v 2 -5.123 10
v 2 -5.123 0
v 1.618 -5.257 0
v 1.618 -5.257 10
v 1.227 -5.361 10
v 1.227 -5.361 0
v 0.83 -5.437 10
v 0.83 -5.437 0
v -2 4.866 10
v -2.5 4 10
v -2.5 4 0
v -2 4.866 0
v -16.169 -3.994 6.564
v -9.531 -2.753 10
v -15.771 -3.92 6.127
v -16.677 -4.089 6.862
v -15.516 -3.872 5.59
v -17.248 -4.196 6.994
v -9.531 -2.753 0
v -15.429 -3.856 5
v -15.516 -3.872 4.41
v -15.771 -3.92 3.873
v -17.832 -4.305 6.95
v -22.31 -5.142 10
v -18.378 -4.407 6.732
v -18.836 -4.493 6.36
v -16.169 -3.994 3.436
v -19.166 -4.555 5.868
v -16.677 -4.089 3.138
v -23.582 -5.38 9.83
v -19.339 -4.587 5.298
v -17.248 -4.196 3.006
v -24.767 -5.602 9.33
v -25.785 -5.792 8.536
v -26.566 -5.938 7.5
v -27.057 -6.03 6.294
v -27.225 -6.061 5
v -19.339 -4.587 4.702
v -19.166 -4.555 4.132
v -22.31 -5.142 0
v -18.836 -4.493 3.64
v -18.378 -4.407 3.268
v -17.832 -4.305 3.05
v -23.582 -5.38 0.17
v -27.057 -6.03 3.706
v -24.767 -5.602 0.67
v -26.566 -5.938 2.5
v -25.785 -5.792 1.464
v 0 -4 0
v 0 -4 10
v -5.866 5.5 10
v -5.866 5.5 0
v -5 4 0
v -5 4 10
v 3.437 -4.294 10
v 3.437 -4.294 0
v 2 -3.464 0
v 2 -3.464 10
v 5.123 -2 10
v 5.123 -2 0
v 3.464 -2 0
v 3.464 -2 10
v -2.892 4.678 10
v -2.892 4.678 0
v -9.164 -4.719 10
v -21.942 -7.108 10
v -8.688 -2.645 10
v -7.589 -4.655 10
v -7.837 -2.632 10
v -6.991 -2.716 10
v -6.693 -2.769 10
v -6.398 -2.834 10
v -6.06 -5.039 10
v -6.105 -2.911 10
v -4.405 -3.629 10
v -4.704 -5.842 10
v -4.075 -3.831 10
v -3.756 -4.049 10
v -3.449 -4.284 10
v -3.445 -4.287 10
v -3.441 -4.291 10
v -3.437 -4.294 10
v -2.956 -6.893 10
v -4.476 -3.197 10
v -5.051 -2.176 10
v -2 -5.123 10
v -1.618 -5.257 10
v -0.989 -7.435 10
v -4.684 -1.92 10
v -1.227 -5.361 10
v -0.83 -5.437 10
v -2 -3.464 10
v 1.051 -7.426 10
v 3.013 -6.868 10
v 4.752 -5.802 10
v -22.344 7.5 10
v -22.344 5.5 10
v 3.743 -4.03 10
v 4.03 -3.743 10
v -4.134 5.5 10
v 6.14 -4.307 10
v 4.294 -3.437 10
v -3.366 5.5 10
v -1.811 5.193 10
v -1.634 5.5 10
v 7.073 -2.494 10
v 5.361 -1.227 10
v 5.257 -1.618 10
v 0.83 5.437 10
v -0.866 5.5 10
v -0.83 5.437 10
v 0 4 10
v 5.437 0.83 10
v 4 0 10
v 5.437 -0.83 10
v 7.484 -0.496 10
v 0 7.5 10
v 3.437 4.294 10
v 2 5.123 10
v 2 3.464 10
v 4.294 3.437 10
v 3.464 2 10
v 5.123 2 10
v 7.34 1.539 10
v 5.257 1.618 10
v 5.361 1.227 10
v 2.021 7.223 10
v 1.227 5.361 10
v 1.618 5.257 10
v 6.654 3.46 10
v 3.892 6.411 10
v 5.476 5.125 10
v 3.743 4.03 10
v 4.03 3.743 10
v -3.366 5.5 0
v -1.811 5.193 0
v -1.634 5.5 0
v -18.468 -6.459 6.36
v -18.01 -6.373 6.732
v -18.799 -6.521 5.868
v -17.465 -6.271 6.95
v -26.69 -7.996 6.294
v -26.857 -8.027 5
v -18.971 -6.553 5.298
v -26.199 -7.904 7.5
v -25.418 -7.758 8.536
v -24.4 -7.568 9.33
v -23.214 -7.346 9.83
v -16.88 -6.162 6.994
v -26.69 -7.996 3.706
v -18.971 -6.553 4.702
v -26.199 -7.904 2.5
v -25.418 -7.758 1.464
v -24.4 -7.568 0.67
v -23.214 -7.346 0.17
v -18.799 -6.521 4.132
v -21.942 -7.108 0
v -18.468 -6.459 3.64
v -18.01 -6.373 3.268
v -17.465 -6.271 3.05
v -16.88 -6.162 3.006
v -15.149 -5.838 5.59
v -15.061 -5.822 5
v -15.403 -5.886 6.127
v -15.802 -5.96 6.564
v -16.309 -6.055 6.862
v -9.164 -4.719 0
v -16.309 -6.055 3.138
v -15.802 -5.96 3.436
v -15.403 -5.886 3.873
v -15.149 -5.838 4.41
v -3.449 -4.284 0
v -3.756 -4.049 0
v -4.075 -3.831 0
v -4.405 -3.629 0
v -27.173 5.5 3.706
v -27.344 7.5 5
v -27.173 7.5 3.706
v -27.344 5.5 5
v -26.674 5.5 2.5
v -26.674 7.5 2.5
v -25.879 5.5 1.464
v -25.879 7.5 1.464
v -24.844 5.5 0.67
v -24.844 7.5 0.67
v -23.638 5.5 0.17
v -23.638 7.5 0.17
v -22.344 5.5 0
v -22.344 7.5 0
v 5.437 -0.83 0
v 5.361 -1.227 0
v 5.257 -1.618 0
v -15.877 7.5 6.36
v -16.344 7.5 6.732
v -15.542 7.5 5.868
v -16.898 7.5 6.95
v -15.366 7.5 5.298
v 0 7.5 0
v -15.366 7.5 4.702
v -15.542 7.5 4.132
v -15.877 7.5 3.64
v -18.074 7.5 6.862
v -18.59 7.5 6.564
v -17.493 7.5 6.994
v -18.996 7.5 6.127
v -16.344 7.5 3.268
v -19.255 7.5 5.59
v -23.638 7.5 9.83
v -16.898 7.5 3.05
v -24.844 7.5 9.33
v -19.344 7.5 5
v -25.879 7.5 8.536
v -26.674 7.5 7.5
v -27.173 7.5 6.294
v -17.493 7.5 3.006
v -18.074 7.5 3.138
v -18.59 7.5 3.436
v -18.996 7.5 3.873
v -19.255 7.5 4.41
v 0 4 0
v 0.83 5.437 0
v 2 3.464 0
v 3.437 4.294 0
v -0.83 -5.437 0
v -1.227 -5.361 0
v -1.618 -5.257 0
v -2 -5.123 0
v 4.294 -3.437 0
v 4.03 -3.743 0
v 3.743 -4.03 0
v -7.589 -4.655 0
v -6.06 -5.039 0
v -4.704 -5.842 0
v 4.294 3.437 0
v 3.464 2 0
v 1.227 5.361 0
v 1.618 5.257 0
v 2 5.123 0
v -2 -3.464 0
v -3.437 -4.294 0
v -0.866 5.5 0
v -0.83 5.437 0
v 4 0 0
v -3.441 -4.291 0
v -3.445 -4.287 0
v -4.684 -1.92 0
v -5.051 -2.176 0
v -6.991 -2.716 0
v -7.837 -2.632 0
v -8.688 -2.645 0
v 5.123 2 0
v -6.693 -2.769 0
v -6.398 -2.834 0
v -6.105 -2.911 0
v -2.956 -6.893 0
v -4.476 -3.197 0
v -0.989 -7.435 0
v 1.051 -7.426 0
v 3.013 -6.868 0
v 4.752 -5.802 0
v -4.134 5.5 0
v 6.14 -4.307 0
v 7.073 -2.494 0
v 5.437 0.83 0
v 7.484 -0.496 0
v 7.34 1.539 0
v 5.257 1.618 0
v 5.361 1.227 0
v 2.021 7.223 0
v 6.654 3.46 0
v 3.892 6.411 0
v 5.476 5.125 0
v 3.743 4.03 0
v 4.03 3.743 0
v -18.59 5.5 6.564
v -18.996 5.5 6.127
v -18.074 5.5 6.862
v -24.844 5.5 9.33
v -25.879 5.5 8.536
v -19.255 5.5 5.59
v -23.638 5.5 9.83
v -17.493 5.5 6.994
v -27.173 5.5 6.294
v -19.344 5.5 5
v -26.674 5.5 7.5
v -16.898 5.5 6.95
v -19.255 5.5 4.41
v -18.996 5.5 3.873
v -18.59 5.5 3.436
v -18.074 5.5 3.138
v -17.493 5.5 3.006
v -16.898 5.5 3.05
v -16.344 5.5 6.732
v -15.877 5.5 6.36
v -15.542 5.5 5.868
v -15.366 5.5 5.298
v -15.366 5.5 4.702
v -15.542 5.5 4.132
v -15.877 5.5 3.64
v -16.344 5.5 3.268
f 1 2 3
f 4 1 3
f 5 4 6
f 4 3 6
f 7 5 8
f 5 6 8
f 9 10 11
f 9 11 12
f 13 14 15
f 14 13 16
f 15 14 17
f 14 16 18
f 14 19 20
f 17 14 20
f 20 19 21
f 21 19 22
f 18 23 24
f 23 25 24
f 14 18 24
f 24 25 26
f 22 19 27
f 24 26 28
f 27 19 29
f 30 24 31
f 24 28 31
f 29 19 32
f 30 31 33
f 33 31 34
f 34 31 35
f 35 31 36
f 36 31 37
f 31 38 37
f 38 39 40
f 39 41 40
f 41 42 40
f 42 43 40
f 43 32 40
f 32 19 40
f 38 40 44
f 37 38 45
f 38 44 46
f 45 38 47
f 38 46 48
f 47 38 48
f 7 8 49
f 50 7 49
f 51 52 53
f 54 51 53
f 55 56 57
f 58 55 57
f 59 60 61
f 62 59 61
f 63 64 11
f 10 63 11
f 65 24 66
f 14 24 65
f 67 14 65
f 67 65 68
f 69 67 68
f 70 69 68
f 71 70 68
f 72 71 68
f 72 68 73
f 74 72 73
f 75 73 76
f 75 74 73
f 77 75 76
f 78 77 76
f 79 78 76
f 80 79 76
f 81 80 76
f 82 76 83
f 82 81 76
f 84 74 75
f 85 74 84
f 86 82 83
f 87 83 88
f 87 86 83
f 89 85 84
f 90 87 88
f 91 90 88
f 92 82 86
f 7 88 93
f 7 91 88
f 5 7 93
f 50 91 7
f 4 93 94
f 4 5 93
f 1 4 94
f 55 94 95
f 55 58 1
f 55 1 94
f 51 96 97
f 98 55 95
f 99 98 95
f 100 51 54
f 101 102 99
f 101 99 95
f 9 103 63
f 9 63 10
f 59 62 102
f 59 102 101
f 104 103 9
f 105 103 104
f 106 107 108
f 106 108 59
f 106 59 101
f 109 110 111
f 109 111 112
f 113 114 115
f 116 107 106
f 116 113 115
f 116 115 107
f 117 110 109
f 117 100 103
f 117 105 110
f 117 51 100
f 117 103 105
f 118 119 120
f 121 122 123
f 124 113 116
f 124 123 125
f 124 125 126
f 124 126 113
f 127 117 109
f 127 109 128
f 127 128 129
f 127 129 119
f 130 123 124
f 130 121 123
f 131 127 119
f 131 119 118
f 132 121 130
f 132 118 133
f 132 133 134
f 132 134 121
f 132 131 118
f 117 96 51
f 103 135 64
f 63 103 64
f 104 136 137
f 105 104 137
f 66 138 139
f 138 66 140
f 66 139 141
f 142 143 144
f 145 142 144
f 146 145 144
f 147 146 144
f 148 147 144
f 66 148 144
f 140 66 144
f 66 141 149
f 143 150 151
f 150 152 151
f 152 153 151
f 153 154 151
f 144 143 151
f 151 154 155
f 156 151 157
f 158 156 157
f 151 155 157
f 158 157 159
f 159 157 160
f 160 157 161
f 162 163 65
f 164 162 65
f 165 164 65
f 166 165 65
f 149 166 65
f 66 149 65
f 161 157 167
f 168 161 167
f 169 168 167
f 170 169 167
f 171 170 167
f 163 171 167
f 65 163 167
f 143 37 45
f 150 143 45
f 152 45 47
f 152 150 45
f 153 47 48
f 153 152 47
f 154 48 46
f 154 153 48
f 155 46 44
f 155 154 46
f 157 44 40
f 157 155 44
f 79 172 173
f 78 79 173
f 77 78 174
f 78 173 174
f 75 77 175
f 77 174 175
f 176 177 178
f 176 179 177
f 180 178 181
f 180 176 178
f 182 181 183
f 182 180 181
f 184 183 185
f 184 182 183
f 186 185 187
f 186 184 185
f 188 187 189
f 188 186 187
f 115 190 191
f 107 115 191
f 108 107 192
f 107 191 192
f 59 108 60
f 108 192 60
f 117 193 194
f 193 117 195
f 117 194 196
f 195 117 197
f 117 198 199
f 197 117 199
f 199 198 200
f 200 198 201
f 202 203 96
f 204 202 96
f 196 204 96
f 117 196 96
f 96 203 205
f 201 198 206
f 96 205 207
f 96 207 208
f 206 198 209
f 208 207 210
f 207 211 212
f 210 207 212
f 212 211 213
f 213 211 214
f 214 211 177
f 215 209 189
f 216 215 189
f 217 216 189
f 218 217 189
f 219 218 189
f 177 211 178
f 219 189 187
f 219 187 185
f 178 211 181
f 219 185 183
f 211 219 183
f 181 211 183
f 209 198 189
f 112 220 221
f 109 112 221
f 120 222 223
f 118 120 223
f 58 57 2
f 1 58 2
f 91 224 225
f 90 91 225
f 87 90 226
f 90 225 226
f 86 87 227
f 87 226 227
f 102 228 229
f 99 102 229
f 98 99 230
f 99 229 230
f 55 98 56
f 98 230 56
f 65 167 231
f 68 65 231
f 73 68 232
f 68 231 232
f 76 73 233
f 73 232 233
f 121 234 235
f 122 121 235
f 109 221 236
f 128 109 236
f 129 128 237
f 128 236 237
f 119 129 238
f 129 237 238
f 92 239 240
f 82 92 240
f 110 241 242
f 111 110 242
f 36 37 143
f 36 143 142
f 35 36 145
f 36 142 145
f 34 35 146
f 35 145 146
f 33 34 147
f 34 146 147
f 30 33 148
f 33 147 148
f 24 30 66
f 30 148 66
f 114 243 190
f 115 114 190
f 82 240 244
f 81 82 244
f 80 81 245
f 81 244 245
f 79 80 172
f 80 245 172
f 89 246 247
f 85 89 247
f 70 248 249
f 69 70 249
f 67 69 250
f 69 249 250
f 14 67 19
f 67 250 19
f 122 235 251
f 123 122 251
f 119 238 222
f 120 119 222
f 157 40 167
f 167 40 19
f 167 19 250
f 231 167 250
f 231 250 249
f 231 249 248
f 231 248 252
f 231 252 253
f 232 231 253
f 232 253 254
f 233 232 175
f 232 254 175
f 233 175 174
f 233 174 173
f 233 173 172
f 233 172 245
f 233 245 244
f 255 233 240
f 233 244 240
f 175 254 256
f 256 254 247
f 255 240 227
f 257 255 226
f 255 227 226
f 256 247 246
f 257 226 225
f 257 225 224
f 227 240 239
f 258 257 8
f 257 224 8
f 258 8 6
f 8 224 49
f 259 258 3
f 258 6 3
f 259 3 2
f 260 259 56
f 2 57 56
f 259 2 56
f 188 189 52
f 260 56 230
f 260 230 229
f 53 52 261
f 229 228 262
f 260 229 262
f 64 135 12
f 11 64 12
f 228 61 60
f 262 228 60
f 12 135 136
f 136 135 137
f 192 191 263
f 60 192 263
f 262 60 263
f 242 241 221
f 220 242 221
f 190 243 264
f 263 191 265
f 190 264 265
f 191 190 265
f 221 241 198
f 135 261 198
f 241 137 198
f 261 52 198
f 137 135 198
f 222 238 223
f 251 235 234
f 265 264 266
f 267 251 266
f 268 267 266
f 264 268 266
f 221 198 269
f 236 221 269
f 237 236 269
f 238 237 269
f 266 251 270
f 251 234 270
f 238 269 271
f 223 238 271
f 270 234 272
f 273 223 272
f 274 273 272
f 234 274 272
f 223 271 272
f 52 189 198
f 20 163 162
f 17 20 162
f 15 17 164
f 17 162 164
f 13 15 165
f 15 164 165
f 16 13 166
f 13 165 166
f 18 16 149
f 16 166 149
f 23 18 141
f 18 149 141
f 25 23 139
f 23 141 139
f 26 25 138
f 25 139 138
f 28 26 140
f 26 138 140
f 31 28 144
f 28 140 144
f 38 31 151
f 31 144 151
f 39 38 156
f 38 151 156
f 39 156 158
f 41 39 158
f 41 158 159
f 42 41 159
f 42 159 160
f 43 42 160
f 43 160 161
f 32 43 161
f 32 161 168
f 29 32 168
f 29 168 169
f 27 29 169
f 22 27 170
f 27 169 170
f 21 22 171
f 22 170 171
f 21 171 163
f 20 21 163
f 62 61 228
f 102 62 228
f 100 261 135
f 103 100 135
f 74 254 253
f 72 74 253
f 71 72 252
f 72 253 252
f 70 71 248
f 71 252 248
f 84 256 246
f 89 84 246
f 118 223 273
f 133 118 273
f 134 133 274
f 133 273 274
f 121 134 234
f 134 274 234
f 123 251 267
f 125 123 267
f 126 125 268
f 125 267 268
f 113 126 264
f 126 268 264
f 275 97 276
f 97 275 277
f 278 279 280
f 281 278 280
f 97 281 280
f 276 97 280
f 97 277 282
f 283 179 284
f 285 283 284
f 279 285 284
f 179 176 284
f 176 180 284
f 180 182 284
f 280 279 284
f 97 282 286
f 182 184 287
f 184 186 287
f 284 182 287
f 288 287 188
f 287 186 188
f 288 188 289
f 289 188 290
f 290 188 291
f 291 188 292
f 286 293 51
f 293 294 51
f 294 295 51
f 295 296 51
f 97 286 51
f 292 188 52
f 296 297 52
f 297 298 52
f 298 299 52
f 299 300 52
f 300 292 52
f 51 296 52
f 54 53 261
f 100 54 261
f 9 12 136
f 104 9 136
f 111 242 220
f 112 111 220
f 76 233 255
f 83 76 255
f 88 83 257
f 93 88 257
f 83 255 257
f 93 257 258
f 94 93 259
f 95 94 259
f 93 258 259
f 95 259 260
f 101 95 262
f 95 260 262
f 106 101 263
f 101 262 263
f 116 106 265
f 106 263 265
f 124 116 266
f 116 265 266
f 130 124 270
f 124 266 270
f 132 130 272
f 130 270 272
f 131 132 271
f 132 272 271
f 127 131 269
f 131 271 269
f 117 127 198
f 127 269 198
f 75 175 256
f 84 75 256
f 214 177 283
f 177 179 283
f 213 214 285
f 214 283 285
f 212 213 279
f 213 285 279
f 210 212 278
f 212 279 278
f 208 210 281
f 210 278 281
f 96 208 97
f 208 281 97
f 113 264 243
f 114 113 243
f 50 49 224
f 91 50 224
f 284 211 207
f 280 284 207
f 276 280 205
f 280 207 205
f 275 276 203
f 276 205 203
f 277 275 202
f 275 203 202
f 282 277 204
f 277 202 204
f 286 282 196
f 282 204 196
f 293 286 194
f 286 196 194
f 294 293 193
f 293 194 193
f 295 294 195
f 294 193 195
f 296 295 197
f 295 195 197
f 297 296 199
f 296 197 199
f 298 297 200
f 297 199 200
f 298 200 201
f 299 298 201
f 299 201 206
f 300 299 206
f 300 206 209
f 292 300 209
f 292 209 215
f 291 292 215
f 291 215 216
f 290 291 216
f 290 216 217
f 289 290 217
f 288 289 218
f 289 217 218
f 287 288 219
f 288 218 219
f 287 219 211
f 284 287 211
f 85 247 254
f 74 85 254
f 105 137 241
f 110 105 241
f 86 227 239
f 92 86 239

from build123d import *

# Parameters (mm, degrees)
F1_DEPTH = 10
F2_R     = 4.99999
F3_R     = 2
F4_DEPTH = 2
F5_R     = 2
F6_DEPTH = 2


# Not quite as in the source:
# - a fillet or chamfer is up to 0.001 mm smaller than in the source, because OpenCascade refuses the exact size


with BuildPart() as f1:
    # F0 (on Top) → F1 (new body)
    with BuildSketch(Plane.XY):
        Polygon((-5, 4), (-4.1339745962, 5.5), (-5.8660254038, 5.5), align=None)
        Polygon((-26.857039656, -8.0272581187), (-9.163588619, -4.7194203959), (-9.5311261437, -2.7534813918), (-27.2245771808, -6.0613191145), align=None)
        with BuildLine():
            ThreePointArc((-3.4370598373, -4.2937884991), (-2.75, -4.7631397208), (-2, -5.123475383))
            Line((-2, -5.123475383), (-2, -3.4641016151))
            Line((-2, -3.4641016151), (-3.4370598373, -4.2937884991))
        make_face()
        with BuildLine():
            ThreePointArc((-0.8296868839, -5.4370598373), (0, -5.5), (0.8296868839, -5.4370598373))
            Line((0.8296868839, -5.4370598373), (0, -4))
            Line((0, -4), (-0.8296868839, -5.4370598373))
        make_face()
        with BuildLine():
            ThreePointArc((2, -5.123475383), (2.75, -4.7631397208), (3.4370598373, -4.2937884991))
            Line((3.4370598373, -4.2937884991), (2, -3.4641016151))
            Line((2, -3.4641016151), (2, -5.123475383))
        make_face()
        with BuildLine():
            ThreePointArc((4.2937884991, -3.4370598373), (4.7631397208, -2.75), (5.123475383, -2))
            Line((5.123475383, -2), (3.4641016151, -2))
            Line((3.4641016151, -2), (4.2937884991, -3.4370598373))
        make_face()
        with BuildLine():
            ThreePointArc((5.4370598373, -0.8296868839), (5.5, 0), (5.4370598373, 0.8296868839))
            Line((5.4370598373, 0.8296868839), (4, 0))
            Line((4, 0), (5.4370598373, -0.8296868839))
        make_face()
        with BuildLine():
            Line((0, 4), (0.8296868839, 5.4370598373))
            ThreePointArc((0.8296868839, 5.4370598373), (0.416035392, 5.4842423864), (0, 5.5))
            Line((0, 5.5), (0, 4))
        make_face()
        with BuildLine():
            ThreePointArc((0, 5.5), (0.416035392, 5.4842423864), (0.8296868839, 5.4370598373))
            Line((0.8296868839, 5.4370598373), (0.8660254038, 5.5))
            Line((0.8660254038, 5.5), (0, 5.5))
        make_face()
        with BuildLine():
            Line((0, 4), (0, 5.5))
            ThreePointArc((0, 5.5), (-0.416035392, 5.4842423864), (-0.8296868839, 5.4370598373))
            Line((-0.8296868839, 5.4370598373), (0, 4))
        make_face()
        with BuildLine():
            Line((-2, 4.8660254038), (-1.8110659829, 5.1932687207))
            ThreePointArc((-1.8110659829, 5.1932687207), (-1.9058525019, 5.1592369824), (-2, 5.123475383))
            Line((-2, 5.123475383), (-2, 4.8660254038))
        make_face()
        with BuildLine():
            Line((-2, 4.8660254038), (-2, 5.123475383))
            ThreePointArc((-2, 5.123475383), (-2.4559554031, 4.9212074797), (-2.8917104606, 4.6784624196))
            Line((-2.8917104606, 4.6784624196), (-2.5, 4))
            Line((-2.5, 4), (-2, 4.8660254038))
        make_face()
        with BuildLine():
            ThreePointArc((-9.163588619, -4.7194203959), (-6.8106363862, -4.7920452574), (-4.7035733226, -5.8417803792))
            ThreePointArc((-4.7035733226, -5.8417803792), (-6.0524247462, -4.4292386131), (-6.9908223073, -2.7163216797))
            ThreePointArc((-6.9908223073, -2.7163216797), (-8.2625591256, -2.6265549538), (-9.5311261437, -2.7534813918))
            Line((-9.5311261437, -2.7534813918), (-9.163588619, -4.7194203959))
        make_face()
        with BuildLine():
            Line((-4.6842221141, -1.9200455203), (-4.9155419039, -2.4672753781))
            ThreePointArc((-4.9155419039, -2.4672753781), (-4.7096941165, -2.8405600379), (-4.4755547297, -3.196781172))
            Line((-4.4755547297, -3.196781172), (-4.6842221141, -1.9200455203))
        make_face()
        with BuildLine():
            Line((-4.6842221141, -1.9200455203), (-5.0512472947, -2.175982713))
            ThreePointArc((-5.0512472947, -2.175982713), (-4.9855224988, -2.3226203765), (-4.9155419039, -2.4672753781))
            Line((-4.9155419039, -2.4672753781), (-4.6842221141, -1.9200455203))
        make_face()
        with BuildLine():
            ThreePointArc((-0.8296868839, 5.4370598373), (-0.416035392, 5.4842423864), (0, 5.5))
            Line((0, 5.5), (-0.8660254038, 5.5))
            Line((-0.8660254038, 5.5), (-0.8296868839, 5.4370598373))
        make_face()
        with BuildLine():
            Line((-5.0512472947, -2.175982713), (-6.104954117, -2.9107627231))
            ThreePointArc((-6.104954117, -2.9107627231), (-5.6640980624, -3.0507217811), (-5.2327078262, -3.2175901813))
            Line((-5.2327078262, -3.2175901813), (-4.9155419039, -2.4672753781))
            ThreePointArc((-4.9155419039, -2.4672753781), (-4.9855224988, -2.3226203765), (-5.0512472947, -2.175982713))
        make_face()
        with BuildLine():
            ThreePointArc((-2, 5.123475383), (-1.9058525019, 5.1592369824), (-1.8110659829, 5.1932687207))
            Line((-1.8110659829, 5.1932687207), (-1.6339745962, 5.5))
            Line((-1.6339745962, 5.5), (-3.3660254038, 5.5))
            Line((-3.3660254038, 5.5), (-2.8917104606, 4.6784624196))
            ThreePointArc((-2.8917104606, 4.6784624196), (-2.4559554031, 4.9212074797), (-2, 5.123475383))
        make_face()
        with BuildLine():
            Line((-4.9155419039, -2.4672753781), (-5.2327078262, -3.2175901813))
            ThreePointArc((-5.2327078262, -3.2175901813), (-4.8124241684, -3.4107332523), (-4.404845606, -3.629416389))
            Line((-4.404845606, -3.629416389), (-4.4755547297, -3.196781172))
            ThreePointArc((-4.4755547297, -3.196781172), (-4.7096941165, -2.8405600379), (-4.9155419039, -2.4672753781))
        make_face()
        with BuildLine():
            ThreePointArc((0.8296868839, 5.4370598373), (1.4235047481, 5.3125920446), (2, 5.123475383))
            Line((2, 5.123475383), (2, 3.4641016151))
            Line((2, 3.4641016151), (3.4370598373, 4.2937884991))
            ThreePointArc((3.4370598373, 4.2937884991), (3.8890872965, 3.8890872965), (4.2937884991, 3.4370598373))
            Line((4.2937884991, 3.4370598373), (3.4641016151, 2))
            Line((3.4641016151, 2), (5.123475383, 2))
            ThreePointArc((5.123475383, 2), (5.3125920446, 1.4235047481), (5.4370598373, 0.8296868839))
            ThreePointArc((5.4370598373, 0.8296868839), (5.5, 0), (5.4370598373, -0.8296868839))
            ThreePointArc((5.4370598373, -0.8296868839), (5.3125920446, -1.4235047481), (5.123475383, -2))
            ThreePointArc((5.123475383, -2), (4.7631397208, -2.75), (4.2937884991, -3.4370598373))
            ThreePointArc((4.2937884991, -3.4370598373), (3.8890872965, -3.8890872965), (3.4370598373, -4.2937884991))
            ThreePointArc((3.4370598373, -4.2937884991), (2.75, -4.7631397208), (2, -5.123475383))
            ThreePointArc((2, -5.123475383), (1.4235047481, -5.3125920446), (0.8296868839, -5.4370598373))
            ThreePointArc((0.8296868839, -5.4370598373), (0, -5.5), (-0.8296868839, -5.4370598373))
            ThreePointArc((-0.8296868839, -5.4370598373), (-1.4235047481, -5.3125920446), (-2, -5.123475383))
            ThreePointArc((-2, -5.123475383), (-2.75, -4.7631397208), (-3.4370598373, -4.2937884991))
            ThreePointArc((-3.4370598373, -4.2937884991), (-3.4431769685, -4.2888847459), (-3.4492871033, -4.2839722781))
            ThreePointArc((-3.4492871033, -4.2839722781), (-3.9144118435, -3.9382205471), (-4.404845606, -3.629416389))
            ThreePointArc((-4.404845606, -3.629416389), (-4.8124241684, -3.4107332523), (-5.2327078262, -3.2175901813))
            ThreePointArc((-5.2327078262, -3.2175901813), (-5.6640980624, -3.0507217811), (-6.104954117, -2.9107627231))
            ThreePointArc((-6.104954117, -2.9107627231), (-6.544946362, -2.800139211), (-6.9908223073, -2.7163216797))
            ThreePointArc((-6.9908223073, -2.7163216797), (-6.0524247462, -4.4292386131), (-4.7035733226, -5.8417803792))
            ThreePointArc((-4.7035733226, -5.8417803792), (7.0733073185, -2.493656668), (0, 7.5))
            Line((0, 7.5), (-27.3435036541, 7.5))
            Line((-27.3435036541, 7.5), (-27.3435036541, 5.5))
            Line((-27.3435036541, 5.5), (-5.8660254038, 5.5))
            Line((-5.8660254038, 5.5), (-4.1339745962, 5.5))
            Line((-4.1339745962, 5.5), (-3.3660254038, 5.5))
            Line((-3.3660254038, 5.5), (-1.6339745962, 5.5))
            Line((-1.6339745962, 5.5), (-0.8660254038, 5.5))
            Line((-0.8660254038, 5.5), (0, 5.5))
            Line((0, 5.5), (0.8660254038, 5.5))
            Line((0.8660254038, 5.5), (0.8296868839, 5.4370598373))
        make_face()
    extrude(amount=F1_DEPTH)

    # F2 (radius 5 in the source; OpenCascade refuses exactly that, so slightly less here)
    f2_edges = [f1.edges().sort_by_distance(p)[0] for p in [
        (-27.343504, 6.5, 10),
        (-27.343504, 6.5, 0),
        (-27.040808, -7.044289, 0),
        (-27.040808, -7.044289, 10),
    ]]
    fillet(f2_edges, radius=F2_R)

    # F3 (on face) → F4 (cut)
    with BuildSketch(Plane(origin=(0.5430486336, -2.9047387492, 0), x_dir=(0.9829695021, 0.1837687624, 0), z_dir=(0.1837687624, -0.9829695021, 0))):
        with Locations((-17.8748101871, 5)):
            Circle(F3_R)
    extrude(amount=-F4_DEPTH, mode=Mode.SUBTRACT)

    # F5 (on face) → F6 (cut)
    with BuildSketch(Plane(origin=(0, 7.5, 0), x_dir=(-1, 0, 0), z_dir=(0, 1, 0))):
        with Locations((17.3435036541, 5)):
            Circle(F5_R)
    extrude(amount=-F6_DEPTH, mode=Mode.SUBTRACT)


solid = f1.part
